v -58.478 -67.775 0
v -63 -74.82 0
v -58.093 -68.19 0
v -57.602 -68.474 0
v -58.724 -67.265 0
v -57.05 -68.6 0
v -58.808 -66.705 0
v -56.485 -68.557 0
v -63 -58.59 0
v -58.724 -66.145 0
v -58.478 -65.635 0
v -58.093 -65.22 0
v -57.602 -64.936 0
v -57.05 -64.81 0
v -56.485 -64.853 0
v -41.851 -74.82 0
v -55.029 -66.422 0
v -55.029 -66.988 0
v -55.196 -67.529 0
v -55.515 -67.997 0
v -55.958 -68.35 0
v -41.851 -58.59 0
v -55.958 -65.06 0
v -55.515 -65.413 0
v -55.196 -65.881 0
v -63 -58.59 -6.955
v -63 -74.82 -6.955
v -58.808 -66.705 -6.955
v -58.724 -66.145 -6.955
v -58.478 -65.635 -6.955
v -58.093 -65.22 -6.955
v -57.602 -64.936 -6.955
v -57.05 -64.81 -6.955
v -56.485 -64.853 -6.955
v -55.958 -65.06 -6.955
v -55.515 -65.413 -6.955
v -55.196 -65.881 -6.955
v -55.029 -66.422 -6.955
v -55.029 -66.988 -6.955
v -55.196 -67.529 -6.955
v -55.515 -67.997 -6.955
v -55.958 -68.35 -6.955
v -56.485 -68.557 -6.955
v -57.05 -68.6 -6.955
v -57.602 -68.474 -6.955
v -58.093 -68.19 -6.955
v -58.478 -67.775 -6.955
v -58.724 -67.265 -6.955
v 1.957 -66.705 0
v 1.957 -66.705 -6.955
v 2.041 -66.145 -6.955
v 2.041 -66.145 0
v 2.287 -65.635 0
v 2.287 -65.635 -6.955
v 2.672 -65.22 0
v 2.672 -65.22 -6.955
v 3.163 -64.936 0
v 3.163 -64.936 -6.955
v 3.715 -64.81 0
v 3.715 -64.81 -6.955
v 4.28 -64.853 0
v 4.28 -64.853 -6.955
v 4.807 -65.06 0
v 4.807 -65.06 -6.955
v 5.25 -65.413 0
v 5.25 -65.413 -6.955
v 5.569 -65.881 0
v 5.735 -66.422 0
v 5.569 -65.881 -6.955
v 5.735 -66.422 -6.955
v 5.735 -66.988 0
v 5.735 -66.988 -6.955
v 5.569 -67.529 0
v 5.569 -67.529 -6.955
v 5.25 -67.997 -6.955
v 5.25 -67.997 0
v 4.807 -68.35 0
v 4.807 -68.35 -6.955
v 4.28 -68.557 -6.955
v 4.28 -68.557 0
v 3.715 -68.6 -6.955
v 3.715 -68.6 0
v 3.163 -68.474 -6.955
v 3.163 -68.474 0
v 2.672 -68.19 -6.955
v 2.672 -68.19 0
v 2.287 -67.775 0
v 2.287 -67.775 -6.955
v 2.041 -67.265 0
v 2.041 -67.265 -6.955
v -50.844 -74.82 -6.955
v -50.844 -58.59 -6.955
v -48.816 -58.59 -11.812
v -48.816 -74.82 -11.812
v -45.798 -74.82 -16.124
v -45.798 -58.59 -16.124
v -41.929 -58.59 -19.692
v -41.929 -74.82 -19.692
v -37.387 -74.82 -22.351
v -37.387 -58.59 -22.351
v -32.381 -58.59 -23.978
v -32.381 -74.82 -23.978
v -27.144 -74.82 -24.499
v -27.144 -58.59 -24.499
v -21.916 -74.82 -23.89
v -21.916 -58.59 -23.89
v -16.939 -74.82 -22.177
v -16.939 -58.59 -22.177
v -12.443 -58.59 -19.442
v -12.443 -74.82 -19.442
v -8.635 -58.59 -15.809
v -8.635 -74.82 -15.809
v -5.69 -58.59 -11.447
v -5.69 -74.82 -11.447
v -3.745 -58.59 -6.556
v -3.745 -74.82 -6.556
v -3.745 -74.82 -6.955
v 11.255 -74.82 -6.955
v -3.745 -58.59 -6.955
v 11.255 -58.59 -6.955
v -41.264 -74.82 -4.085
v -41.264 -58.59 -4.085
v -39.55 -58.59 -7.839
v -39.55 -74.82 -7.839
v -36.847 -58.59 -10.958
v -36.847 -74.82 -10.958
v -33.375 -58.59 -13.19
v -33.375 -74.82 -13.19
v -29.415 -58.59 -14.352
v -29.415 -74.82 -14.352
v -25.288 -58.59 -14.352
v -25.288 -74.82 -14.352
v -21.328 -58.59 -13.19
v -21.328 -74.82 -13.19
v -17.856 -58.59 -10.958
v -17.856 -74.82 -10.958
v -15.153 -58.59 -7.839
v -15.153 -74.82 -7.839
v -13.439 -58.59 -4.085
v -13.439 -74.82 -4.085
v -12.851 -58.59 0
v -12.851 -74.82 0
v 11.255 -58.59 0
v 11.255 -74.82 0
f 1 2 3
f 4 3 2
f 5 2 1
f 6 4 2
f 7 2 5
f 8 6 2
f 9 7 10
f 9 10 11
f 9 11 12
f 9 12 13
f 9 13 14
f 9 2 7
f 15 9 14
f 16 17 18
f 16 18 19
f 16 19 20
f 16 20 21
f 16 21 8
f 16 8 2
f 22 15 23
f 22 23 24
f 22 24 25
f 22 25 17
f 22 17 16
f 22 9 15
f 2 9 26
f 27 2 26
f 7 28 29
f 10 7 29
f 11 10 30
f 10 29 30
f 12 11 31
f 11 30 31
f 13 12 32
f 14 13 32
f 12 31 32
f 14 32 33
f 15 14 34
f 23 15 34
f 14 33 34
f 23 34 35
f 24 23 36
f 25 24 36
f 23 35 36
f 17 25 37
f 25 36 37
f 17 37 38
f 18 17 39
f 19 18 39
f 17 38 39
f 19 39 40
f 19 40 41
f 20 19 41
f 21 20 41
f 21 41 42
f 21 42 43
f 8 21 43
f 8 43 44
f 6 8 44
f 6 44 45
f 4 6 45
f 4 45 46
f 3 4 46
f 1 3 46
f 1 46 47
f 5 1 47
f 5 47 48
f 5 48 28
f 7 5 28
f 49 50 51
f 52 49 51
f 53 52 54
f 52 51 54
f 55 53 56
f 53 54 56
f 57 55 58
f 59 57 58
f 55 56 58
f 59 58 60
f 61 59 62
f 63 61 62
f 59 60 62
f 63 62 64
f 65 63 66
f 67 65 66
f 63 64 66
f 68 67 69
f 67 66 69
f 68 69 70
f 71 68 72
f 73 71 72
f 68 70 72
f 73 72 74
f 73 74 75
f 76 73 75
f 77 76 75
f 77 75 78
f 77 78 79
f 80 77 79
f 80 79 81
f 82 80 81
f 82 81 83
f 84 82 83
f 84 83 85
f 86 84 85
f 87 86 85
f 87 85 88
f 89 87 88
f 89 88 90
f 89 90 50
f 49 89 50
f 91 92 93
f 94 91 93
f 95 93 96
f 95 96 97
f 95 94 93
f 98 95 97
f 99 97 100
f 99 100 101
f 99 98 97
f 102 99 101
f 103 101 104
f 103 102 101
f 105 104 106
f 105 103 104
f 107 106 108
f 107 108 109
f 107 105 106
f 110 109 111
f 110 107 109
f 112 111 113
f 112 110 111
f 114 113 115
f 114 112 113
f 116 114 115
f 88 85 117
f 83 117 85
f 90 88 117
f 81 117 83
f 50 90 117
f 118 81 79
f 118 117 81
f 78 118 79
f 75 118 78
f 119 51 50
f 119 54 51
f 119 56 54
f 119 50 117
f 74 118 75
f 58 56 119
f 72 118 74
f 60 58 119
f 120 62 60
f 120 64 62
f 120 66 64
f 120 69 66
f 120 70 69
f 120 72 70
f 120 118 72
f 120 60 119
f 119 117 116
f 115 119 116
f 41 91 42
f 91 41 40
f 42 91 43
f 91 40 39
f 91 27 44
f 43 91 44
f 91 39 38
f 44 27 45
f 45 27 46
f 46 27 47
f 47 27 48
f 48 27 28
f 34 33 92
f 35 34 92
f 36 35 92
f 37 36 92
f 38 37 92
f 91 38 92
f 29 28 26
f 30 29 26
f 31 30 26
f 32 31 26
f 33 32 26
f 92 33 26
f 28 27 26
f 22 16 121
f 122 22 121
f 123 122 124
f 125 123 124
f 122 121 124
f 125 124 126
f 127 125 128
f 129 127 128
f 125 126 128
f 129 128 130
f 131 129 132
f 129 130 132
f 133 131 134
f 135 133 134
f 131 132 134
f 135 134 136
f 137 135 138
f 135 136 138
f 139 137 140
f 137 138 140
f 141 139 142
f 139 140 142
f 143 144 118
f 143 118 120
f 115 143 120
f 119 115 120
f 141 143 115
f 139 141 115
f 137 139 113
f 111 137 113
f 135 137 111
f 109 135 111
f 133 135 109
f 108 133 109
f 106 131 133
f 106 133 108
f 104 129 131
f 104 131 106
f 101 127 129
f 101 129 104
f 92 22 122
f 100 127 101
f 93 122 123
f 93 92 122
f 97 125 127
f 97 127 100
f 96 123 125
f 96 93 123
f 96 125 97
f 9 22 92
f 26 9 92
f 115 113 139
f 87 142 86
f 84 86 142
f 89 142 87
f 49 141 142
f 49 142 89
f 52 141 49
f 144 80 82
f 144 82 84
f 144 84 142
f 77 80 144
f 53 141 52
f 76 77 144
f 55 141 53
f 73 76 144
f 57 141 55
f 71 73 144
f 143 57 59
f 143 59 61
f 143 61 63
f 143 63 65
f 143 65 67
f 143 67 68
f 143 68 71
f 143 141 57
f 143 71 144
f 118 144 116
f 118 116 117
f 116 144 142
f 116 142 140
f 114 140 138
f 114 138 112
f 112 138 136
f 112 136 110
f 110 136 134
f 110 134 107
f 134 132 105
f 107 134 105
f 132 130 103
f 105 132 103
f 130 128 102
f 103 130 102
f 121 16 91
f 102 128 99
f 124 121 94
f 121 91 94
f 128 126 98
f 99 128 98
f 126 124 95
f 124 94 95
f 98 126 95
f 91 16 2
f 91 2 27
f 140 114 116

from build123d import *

# Parameters (mm, degrees)
SKETCH_1_W                = 48.51
SKETCH_1_H                = 34
SKETCH_1_W_2              = 28.51
SKETCH_1_H_2              = 14
EXTRUDE_1_DEPTH           = 12.25
SKETCH_2_R                = 1.91
CUT_EXTRUDE_1_DEPTH       = 33.05257439
SKETCH_4_W                = 13
SKETCH_4_H                = 13.91
EXTRUDE_1_2_DEPTH         = 74.82
SKETCH_5_W                = 13.91
SKETCH_5_H                = 16.23
EXTRUDE_2_DEPTH           = 15
SKETCH_7_R                = 24.5
SKETCH_7_R_2              = 14.5
EXTRUDE_2_2_DEPTH         = 16.23
SKETCH_12_R               = 1.9
CUT_EXTRUDE_4_DEPTH       = 97.312124675
EXTRUDE_3_DEPTH           = 10
EXTRUDE_3_DEPTH_BACK      = 8
SKETCH_13_W               = 13.91
SKETCH_13_H               = 16.23
SKETCH_14_R               = 1.9
CUT_EXTRUDE_5_DEPTH       = 103.744583434
SKETCH_16_W               = 90.709398763
SKETCH_16_H               = 28.955068616
CUT_EXTRUDE_7_DEPTH       = 111.229011154
SKETCH_18_W               = 13
SKETCH_18_H               = 93.080932143
CUT_EXTRUDE_10_DEPTH      = 27
CUT_EXTRUDE_11_DEPTH      = 57
CUT_EXTRUDE_11_DEPTH_BACK = 27
SKETCH_17_W               = 20.23049449
SKETCH_17_H               = 80.723570055


with BuildPart() as part:
    # 草圖1 → Extrude 1 (new body)
    with BuildSketch(Plane(origin=(0, 0, 0), x_dir=(1, 0, 0), z_dir=(0, 1, 0))):
        Rectangle(SKETCH_1_W, SKETCH_1_H)
        Rectangle(SKETCH_1_W_2, SKETCH_1_H_2, mode=Mode.SUBTRACT)
    extrude(amount=EXTRUDE_1_DEPTH)

    # 草圖2 → 除料-伸長1 (cut, through all)
    with BuildSketch(Plane(origin=(0, 12.25, 0), x_dir=(1, 0, 0), z_dir=(0, 1, 0))):
        with Locations(Location((-19.255, 0, 0), (0, 0, 270))):
            Circle(SKETCH_2_R)
        with Locations(Location((19.255, 0, 0), (0, 0, 270))):
            Circle(SKETCH_2_R)
    extrude(amount=-CUT_EXTRUDE_1_DEPTH, mode=Mode.SUBTRACT)

    # 草圖4 → Extrude 1 2 (add)
    with BuildSketch(Plane.XZ):
        with Locations((17.755, 0)):
            Rectangle(SKETCH_4_W, SKETCH_4_H)
    extrude(amount=EXTRUDE_1_2_DEPTH)

    # 草圖5 → Extrude 2 (add)
    with BuildSketch(Plane.ZY.offset(-11.255)):
        with Locations((0, -66.705)):
            Rectangle(SKETCH_5_W, SKETCH_5_H)
    extrude(amount=EXTRUDE_2_DEPTH)

    # 草圖7 → Extrude 2 2 (add)
    with BuildSketch(Plane(origin=(3.626674765, -74.82, 0), x_dir=(1, 0, 0), z_dir=(0, -1, 0))):
        with Locations((-30.978154344, 0)):
            Circle(SKETCH_7_R)
        with Locations((-30.978154344, 0)):
            Circle(SKETCH_7_R_2, mode=Mode.SUBTRACT)
    extrude(amount=-EXTRUDE_2_2_DEPTH)

    # 草圖12 → 除料-伸長4 (cut, through all)
    with BuildSketch(Plane(origin=(0, 0, -6.955), x_dir=(-1, 0, 0), z_dir=(0, 0, -1))):
        with Locations((-3.856713649, -66.705)):
            Circle(SKETCH_12_R)
    extrude(amount=-CUT_EXTRUDE_4_DEPTH, mode=Mode.SUBTRACT)

    # 草圖13 → 填料-伸長3 (add, two sides: drawn at the far end of the back side and taken through both)
    with BuildSketch(Plane(origin=(-55, 0, 0), x_dir=(0, 0, -1), z_dir=(1, 0, 0)).offset(-EXTRUDE_3_DEPTH_BACK)):
        with Locations((0, -66.705)):
            Rectangle(SKETCH_13_W, SKETCH_13_H)
    extrude(amount=EXTRUDE_3_DEPTH + EXTRUDE_3_DEPTH_BACK)

    # 草圖14 → 除料-伸長5 (cut, through all)
    with BuildSketch(Plane(origin=(0, 0, -6.955), x_dir=(-1, 0, 0), z_dir=(0, 0, -1))):
        with Locations((56.908040017, -66.705)):
            Circle(SKETCH_14_R)
    extrude(amount=-CUT_EXTRUDE_5_DEPTH, mode=Mode.SUBTRACT)

    # 草圖16 → 除料-伸長7 (cut, through all)
    with BuildSketch(Plane(origin=(0, 12.25, 0), x_dir=(1, 0, 0), z_dir=(0, 1, 0))):
        with Locations((-17.645300619, -14.477534308)):
            Rectangle(SKETCH_16_W, SKETCH_16_H)
    extrude(amount=-CUT_EXTRUDE_7_DEPTH, mode=Mode.SUBTRACT)

    # 草圖18 → 除料-伸長10 (cut)
    with BuildSketch(Plane.XY):
        with Locations((17.755, -28.279533929)):
            Rectangle(SKETCH_18_W, SKETCH_18_H)
    extrude(amount=-CUT_EXTRUDE_10_DEPTH, mode=Mode.SUBTRACT)


with BuildPart() as cut_extrude_10_piece_1:
    # of the separate pieces the step leaves, piece 1, a body of its own (cut_extrude_10_pieces)
    add(part.part.solids().sort_by_distance((11.255, -58.59, -6.955))[0])


with BuildPart() as cut_extrude_10_piece_2:
    # of the separate pieces the step leaves, piece 2, a body of its own (cut_extrude_10_pieces)
    add(part.part.solids().sort_by_distance((-17.345, 0, 0))[0])

    # 草圖17 → 除料-伸長11 (cut, two sides: drawn at the far end of the back side and taken through both)
    with BuildSketch(Plane.ZY.offset(-11.255).offset(-CUT_EXTRUDE_11_DEPTH_BACK)):
        with Locations((-10.115247245, -18.228214973)):
            Rectangle(SKETCH_17_W, SKETCH_17_H)
    extrude(amount=CUT_EXTRUDE_11_DEPTH + CUT_EXTRUDE_11_DEPTH_BACK, mode=Mode.SUBTRACT)


solid = cut_extrude_10_piece_1.part
